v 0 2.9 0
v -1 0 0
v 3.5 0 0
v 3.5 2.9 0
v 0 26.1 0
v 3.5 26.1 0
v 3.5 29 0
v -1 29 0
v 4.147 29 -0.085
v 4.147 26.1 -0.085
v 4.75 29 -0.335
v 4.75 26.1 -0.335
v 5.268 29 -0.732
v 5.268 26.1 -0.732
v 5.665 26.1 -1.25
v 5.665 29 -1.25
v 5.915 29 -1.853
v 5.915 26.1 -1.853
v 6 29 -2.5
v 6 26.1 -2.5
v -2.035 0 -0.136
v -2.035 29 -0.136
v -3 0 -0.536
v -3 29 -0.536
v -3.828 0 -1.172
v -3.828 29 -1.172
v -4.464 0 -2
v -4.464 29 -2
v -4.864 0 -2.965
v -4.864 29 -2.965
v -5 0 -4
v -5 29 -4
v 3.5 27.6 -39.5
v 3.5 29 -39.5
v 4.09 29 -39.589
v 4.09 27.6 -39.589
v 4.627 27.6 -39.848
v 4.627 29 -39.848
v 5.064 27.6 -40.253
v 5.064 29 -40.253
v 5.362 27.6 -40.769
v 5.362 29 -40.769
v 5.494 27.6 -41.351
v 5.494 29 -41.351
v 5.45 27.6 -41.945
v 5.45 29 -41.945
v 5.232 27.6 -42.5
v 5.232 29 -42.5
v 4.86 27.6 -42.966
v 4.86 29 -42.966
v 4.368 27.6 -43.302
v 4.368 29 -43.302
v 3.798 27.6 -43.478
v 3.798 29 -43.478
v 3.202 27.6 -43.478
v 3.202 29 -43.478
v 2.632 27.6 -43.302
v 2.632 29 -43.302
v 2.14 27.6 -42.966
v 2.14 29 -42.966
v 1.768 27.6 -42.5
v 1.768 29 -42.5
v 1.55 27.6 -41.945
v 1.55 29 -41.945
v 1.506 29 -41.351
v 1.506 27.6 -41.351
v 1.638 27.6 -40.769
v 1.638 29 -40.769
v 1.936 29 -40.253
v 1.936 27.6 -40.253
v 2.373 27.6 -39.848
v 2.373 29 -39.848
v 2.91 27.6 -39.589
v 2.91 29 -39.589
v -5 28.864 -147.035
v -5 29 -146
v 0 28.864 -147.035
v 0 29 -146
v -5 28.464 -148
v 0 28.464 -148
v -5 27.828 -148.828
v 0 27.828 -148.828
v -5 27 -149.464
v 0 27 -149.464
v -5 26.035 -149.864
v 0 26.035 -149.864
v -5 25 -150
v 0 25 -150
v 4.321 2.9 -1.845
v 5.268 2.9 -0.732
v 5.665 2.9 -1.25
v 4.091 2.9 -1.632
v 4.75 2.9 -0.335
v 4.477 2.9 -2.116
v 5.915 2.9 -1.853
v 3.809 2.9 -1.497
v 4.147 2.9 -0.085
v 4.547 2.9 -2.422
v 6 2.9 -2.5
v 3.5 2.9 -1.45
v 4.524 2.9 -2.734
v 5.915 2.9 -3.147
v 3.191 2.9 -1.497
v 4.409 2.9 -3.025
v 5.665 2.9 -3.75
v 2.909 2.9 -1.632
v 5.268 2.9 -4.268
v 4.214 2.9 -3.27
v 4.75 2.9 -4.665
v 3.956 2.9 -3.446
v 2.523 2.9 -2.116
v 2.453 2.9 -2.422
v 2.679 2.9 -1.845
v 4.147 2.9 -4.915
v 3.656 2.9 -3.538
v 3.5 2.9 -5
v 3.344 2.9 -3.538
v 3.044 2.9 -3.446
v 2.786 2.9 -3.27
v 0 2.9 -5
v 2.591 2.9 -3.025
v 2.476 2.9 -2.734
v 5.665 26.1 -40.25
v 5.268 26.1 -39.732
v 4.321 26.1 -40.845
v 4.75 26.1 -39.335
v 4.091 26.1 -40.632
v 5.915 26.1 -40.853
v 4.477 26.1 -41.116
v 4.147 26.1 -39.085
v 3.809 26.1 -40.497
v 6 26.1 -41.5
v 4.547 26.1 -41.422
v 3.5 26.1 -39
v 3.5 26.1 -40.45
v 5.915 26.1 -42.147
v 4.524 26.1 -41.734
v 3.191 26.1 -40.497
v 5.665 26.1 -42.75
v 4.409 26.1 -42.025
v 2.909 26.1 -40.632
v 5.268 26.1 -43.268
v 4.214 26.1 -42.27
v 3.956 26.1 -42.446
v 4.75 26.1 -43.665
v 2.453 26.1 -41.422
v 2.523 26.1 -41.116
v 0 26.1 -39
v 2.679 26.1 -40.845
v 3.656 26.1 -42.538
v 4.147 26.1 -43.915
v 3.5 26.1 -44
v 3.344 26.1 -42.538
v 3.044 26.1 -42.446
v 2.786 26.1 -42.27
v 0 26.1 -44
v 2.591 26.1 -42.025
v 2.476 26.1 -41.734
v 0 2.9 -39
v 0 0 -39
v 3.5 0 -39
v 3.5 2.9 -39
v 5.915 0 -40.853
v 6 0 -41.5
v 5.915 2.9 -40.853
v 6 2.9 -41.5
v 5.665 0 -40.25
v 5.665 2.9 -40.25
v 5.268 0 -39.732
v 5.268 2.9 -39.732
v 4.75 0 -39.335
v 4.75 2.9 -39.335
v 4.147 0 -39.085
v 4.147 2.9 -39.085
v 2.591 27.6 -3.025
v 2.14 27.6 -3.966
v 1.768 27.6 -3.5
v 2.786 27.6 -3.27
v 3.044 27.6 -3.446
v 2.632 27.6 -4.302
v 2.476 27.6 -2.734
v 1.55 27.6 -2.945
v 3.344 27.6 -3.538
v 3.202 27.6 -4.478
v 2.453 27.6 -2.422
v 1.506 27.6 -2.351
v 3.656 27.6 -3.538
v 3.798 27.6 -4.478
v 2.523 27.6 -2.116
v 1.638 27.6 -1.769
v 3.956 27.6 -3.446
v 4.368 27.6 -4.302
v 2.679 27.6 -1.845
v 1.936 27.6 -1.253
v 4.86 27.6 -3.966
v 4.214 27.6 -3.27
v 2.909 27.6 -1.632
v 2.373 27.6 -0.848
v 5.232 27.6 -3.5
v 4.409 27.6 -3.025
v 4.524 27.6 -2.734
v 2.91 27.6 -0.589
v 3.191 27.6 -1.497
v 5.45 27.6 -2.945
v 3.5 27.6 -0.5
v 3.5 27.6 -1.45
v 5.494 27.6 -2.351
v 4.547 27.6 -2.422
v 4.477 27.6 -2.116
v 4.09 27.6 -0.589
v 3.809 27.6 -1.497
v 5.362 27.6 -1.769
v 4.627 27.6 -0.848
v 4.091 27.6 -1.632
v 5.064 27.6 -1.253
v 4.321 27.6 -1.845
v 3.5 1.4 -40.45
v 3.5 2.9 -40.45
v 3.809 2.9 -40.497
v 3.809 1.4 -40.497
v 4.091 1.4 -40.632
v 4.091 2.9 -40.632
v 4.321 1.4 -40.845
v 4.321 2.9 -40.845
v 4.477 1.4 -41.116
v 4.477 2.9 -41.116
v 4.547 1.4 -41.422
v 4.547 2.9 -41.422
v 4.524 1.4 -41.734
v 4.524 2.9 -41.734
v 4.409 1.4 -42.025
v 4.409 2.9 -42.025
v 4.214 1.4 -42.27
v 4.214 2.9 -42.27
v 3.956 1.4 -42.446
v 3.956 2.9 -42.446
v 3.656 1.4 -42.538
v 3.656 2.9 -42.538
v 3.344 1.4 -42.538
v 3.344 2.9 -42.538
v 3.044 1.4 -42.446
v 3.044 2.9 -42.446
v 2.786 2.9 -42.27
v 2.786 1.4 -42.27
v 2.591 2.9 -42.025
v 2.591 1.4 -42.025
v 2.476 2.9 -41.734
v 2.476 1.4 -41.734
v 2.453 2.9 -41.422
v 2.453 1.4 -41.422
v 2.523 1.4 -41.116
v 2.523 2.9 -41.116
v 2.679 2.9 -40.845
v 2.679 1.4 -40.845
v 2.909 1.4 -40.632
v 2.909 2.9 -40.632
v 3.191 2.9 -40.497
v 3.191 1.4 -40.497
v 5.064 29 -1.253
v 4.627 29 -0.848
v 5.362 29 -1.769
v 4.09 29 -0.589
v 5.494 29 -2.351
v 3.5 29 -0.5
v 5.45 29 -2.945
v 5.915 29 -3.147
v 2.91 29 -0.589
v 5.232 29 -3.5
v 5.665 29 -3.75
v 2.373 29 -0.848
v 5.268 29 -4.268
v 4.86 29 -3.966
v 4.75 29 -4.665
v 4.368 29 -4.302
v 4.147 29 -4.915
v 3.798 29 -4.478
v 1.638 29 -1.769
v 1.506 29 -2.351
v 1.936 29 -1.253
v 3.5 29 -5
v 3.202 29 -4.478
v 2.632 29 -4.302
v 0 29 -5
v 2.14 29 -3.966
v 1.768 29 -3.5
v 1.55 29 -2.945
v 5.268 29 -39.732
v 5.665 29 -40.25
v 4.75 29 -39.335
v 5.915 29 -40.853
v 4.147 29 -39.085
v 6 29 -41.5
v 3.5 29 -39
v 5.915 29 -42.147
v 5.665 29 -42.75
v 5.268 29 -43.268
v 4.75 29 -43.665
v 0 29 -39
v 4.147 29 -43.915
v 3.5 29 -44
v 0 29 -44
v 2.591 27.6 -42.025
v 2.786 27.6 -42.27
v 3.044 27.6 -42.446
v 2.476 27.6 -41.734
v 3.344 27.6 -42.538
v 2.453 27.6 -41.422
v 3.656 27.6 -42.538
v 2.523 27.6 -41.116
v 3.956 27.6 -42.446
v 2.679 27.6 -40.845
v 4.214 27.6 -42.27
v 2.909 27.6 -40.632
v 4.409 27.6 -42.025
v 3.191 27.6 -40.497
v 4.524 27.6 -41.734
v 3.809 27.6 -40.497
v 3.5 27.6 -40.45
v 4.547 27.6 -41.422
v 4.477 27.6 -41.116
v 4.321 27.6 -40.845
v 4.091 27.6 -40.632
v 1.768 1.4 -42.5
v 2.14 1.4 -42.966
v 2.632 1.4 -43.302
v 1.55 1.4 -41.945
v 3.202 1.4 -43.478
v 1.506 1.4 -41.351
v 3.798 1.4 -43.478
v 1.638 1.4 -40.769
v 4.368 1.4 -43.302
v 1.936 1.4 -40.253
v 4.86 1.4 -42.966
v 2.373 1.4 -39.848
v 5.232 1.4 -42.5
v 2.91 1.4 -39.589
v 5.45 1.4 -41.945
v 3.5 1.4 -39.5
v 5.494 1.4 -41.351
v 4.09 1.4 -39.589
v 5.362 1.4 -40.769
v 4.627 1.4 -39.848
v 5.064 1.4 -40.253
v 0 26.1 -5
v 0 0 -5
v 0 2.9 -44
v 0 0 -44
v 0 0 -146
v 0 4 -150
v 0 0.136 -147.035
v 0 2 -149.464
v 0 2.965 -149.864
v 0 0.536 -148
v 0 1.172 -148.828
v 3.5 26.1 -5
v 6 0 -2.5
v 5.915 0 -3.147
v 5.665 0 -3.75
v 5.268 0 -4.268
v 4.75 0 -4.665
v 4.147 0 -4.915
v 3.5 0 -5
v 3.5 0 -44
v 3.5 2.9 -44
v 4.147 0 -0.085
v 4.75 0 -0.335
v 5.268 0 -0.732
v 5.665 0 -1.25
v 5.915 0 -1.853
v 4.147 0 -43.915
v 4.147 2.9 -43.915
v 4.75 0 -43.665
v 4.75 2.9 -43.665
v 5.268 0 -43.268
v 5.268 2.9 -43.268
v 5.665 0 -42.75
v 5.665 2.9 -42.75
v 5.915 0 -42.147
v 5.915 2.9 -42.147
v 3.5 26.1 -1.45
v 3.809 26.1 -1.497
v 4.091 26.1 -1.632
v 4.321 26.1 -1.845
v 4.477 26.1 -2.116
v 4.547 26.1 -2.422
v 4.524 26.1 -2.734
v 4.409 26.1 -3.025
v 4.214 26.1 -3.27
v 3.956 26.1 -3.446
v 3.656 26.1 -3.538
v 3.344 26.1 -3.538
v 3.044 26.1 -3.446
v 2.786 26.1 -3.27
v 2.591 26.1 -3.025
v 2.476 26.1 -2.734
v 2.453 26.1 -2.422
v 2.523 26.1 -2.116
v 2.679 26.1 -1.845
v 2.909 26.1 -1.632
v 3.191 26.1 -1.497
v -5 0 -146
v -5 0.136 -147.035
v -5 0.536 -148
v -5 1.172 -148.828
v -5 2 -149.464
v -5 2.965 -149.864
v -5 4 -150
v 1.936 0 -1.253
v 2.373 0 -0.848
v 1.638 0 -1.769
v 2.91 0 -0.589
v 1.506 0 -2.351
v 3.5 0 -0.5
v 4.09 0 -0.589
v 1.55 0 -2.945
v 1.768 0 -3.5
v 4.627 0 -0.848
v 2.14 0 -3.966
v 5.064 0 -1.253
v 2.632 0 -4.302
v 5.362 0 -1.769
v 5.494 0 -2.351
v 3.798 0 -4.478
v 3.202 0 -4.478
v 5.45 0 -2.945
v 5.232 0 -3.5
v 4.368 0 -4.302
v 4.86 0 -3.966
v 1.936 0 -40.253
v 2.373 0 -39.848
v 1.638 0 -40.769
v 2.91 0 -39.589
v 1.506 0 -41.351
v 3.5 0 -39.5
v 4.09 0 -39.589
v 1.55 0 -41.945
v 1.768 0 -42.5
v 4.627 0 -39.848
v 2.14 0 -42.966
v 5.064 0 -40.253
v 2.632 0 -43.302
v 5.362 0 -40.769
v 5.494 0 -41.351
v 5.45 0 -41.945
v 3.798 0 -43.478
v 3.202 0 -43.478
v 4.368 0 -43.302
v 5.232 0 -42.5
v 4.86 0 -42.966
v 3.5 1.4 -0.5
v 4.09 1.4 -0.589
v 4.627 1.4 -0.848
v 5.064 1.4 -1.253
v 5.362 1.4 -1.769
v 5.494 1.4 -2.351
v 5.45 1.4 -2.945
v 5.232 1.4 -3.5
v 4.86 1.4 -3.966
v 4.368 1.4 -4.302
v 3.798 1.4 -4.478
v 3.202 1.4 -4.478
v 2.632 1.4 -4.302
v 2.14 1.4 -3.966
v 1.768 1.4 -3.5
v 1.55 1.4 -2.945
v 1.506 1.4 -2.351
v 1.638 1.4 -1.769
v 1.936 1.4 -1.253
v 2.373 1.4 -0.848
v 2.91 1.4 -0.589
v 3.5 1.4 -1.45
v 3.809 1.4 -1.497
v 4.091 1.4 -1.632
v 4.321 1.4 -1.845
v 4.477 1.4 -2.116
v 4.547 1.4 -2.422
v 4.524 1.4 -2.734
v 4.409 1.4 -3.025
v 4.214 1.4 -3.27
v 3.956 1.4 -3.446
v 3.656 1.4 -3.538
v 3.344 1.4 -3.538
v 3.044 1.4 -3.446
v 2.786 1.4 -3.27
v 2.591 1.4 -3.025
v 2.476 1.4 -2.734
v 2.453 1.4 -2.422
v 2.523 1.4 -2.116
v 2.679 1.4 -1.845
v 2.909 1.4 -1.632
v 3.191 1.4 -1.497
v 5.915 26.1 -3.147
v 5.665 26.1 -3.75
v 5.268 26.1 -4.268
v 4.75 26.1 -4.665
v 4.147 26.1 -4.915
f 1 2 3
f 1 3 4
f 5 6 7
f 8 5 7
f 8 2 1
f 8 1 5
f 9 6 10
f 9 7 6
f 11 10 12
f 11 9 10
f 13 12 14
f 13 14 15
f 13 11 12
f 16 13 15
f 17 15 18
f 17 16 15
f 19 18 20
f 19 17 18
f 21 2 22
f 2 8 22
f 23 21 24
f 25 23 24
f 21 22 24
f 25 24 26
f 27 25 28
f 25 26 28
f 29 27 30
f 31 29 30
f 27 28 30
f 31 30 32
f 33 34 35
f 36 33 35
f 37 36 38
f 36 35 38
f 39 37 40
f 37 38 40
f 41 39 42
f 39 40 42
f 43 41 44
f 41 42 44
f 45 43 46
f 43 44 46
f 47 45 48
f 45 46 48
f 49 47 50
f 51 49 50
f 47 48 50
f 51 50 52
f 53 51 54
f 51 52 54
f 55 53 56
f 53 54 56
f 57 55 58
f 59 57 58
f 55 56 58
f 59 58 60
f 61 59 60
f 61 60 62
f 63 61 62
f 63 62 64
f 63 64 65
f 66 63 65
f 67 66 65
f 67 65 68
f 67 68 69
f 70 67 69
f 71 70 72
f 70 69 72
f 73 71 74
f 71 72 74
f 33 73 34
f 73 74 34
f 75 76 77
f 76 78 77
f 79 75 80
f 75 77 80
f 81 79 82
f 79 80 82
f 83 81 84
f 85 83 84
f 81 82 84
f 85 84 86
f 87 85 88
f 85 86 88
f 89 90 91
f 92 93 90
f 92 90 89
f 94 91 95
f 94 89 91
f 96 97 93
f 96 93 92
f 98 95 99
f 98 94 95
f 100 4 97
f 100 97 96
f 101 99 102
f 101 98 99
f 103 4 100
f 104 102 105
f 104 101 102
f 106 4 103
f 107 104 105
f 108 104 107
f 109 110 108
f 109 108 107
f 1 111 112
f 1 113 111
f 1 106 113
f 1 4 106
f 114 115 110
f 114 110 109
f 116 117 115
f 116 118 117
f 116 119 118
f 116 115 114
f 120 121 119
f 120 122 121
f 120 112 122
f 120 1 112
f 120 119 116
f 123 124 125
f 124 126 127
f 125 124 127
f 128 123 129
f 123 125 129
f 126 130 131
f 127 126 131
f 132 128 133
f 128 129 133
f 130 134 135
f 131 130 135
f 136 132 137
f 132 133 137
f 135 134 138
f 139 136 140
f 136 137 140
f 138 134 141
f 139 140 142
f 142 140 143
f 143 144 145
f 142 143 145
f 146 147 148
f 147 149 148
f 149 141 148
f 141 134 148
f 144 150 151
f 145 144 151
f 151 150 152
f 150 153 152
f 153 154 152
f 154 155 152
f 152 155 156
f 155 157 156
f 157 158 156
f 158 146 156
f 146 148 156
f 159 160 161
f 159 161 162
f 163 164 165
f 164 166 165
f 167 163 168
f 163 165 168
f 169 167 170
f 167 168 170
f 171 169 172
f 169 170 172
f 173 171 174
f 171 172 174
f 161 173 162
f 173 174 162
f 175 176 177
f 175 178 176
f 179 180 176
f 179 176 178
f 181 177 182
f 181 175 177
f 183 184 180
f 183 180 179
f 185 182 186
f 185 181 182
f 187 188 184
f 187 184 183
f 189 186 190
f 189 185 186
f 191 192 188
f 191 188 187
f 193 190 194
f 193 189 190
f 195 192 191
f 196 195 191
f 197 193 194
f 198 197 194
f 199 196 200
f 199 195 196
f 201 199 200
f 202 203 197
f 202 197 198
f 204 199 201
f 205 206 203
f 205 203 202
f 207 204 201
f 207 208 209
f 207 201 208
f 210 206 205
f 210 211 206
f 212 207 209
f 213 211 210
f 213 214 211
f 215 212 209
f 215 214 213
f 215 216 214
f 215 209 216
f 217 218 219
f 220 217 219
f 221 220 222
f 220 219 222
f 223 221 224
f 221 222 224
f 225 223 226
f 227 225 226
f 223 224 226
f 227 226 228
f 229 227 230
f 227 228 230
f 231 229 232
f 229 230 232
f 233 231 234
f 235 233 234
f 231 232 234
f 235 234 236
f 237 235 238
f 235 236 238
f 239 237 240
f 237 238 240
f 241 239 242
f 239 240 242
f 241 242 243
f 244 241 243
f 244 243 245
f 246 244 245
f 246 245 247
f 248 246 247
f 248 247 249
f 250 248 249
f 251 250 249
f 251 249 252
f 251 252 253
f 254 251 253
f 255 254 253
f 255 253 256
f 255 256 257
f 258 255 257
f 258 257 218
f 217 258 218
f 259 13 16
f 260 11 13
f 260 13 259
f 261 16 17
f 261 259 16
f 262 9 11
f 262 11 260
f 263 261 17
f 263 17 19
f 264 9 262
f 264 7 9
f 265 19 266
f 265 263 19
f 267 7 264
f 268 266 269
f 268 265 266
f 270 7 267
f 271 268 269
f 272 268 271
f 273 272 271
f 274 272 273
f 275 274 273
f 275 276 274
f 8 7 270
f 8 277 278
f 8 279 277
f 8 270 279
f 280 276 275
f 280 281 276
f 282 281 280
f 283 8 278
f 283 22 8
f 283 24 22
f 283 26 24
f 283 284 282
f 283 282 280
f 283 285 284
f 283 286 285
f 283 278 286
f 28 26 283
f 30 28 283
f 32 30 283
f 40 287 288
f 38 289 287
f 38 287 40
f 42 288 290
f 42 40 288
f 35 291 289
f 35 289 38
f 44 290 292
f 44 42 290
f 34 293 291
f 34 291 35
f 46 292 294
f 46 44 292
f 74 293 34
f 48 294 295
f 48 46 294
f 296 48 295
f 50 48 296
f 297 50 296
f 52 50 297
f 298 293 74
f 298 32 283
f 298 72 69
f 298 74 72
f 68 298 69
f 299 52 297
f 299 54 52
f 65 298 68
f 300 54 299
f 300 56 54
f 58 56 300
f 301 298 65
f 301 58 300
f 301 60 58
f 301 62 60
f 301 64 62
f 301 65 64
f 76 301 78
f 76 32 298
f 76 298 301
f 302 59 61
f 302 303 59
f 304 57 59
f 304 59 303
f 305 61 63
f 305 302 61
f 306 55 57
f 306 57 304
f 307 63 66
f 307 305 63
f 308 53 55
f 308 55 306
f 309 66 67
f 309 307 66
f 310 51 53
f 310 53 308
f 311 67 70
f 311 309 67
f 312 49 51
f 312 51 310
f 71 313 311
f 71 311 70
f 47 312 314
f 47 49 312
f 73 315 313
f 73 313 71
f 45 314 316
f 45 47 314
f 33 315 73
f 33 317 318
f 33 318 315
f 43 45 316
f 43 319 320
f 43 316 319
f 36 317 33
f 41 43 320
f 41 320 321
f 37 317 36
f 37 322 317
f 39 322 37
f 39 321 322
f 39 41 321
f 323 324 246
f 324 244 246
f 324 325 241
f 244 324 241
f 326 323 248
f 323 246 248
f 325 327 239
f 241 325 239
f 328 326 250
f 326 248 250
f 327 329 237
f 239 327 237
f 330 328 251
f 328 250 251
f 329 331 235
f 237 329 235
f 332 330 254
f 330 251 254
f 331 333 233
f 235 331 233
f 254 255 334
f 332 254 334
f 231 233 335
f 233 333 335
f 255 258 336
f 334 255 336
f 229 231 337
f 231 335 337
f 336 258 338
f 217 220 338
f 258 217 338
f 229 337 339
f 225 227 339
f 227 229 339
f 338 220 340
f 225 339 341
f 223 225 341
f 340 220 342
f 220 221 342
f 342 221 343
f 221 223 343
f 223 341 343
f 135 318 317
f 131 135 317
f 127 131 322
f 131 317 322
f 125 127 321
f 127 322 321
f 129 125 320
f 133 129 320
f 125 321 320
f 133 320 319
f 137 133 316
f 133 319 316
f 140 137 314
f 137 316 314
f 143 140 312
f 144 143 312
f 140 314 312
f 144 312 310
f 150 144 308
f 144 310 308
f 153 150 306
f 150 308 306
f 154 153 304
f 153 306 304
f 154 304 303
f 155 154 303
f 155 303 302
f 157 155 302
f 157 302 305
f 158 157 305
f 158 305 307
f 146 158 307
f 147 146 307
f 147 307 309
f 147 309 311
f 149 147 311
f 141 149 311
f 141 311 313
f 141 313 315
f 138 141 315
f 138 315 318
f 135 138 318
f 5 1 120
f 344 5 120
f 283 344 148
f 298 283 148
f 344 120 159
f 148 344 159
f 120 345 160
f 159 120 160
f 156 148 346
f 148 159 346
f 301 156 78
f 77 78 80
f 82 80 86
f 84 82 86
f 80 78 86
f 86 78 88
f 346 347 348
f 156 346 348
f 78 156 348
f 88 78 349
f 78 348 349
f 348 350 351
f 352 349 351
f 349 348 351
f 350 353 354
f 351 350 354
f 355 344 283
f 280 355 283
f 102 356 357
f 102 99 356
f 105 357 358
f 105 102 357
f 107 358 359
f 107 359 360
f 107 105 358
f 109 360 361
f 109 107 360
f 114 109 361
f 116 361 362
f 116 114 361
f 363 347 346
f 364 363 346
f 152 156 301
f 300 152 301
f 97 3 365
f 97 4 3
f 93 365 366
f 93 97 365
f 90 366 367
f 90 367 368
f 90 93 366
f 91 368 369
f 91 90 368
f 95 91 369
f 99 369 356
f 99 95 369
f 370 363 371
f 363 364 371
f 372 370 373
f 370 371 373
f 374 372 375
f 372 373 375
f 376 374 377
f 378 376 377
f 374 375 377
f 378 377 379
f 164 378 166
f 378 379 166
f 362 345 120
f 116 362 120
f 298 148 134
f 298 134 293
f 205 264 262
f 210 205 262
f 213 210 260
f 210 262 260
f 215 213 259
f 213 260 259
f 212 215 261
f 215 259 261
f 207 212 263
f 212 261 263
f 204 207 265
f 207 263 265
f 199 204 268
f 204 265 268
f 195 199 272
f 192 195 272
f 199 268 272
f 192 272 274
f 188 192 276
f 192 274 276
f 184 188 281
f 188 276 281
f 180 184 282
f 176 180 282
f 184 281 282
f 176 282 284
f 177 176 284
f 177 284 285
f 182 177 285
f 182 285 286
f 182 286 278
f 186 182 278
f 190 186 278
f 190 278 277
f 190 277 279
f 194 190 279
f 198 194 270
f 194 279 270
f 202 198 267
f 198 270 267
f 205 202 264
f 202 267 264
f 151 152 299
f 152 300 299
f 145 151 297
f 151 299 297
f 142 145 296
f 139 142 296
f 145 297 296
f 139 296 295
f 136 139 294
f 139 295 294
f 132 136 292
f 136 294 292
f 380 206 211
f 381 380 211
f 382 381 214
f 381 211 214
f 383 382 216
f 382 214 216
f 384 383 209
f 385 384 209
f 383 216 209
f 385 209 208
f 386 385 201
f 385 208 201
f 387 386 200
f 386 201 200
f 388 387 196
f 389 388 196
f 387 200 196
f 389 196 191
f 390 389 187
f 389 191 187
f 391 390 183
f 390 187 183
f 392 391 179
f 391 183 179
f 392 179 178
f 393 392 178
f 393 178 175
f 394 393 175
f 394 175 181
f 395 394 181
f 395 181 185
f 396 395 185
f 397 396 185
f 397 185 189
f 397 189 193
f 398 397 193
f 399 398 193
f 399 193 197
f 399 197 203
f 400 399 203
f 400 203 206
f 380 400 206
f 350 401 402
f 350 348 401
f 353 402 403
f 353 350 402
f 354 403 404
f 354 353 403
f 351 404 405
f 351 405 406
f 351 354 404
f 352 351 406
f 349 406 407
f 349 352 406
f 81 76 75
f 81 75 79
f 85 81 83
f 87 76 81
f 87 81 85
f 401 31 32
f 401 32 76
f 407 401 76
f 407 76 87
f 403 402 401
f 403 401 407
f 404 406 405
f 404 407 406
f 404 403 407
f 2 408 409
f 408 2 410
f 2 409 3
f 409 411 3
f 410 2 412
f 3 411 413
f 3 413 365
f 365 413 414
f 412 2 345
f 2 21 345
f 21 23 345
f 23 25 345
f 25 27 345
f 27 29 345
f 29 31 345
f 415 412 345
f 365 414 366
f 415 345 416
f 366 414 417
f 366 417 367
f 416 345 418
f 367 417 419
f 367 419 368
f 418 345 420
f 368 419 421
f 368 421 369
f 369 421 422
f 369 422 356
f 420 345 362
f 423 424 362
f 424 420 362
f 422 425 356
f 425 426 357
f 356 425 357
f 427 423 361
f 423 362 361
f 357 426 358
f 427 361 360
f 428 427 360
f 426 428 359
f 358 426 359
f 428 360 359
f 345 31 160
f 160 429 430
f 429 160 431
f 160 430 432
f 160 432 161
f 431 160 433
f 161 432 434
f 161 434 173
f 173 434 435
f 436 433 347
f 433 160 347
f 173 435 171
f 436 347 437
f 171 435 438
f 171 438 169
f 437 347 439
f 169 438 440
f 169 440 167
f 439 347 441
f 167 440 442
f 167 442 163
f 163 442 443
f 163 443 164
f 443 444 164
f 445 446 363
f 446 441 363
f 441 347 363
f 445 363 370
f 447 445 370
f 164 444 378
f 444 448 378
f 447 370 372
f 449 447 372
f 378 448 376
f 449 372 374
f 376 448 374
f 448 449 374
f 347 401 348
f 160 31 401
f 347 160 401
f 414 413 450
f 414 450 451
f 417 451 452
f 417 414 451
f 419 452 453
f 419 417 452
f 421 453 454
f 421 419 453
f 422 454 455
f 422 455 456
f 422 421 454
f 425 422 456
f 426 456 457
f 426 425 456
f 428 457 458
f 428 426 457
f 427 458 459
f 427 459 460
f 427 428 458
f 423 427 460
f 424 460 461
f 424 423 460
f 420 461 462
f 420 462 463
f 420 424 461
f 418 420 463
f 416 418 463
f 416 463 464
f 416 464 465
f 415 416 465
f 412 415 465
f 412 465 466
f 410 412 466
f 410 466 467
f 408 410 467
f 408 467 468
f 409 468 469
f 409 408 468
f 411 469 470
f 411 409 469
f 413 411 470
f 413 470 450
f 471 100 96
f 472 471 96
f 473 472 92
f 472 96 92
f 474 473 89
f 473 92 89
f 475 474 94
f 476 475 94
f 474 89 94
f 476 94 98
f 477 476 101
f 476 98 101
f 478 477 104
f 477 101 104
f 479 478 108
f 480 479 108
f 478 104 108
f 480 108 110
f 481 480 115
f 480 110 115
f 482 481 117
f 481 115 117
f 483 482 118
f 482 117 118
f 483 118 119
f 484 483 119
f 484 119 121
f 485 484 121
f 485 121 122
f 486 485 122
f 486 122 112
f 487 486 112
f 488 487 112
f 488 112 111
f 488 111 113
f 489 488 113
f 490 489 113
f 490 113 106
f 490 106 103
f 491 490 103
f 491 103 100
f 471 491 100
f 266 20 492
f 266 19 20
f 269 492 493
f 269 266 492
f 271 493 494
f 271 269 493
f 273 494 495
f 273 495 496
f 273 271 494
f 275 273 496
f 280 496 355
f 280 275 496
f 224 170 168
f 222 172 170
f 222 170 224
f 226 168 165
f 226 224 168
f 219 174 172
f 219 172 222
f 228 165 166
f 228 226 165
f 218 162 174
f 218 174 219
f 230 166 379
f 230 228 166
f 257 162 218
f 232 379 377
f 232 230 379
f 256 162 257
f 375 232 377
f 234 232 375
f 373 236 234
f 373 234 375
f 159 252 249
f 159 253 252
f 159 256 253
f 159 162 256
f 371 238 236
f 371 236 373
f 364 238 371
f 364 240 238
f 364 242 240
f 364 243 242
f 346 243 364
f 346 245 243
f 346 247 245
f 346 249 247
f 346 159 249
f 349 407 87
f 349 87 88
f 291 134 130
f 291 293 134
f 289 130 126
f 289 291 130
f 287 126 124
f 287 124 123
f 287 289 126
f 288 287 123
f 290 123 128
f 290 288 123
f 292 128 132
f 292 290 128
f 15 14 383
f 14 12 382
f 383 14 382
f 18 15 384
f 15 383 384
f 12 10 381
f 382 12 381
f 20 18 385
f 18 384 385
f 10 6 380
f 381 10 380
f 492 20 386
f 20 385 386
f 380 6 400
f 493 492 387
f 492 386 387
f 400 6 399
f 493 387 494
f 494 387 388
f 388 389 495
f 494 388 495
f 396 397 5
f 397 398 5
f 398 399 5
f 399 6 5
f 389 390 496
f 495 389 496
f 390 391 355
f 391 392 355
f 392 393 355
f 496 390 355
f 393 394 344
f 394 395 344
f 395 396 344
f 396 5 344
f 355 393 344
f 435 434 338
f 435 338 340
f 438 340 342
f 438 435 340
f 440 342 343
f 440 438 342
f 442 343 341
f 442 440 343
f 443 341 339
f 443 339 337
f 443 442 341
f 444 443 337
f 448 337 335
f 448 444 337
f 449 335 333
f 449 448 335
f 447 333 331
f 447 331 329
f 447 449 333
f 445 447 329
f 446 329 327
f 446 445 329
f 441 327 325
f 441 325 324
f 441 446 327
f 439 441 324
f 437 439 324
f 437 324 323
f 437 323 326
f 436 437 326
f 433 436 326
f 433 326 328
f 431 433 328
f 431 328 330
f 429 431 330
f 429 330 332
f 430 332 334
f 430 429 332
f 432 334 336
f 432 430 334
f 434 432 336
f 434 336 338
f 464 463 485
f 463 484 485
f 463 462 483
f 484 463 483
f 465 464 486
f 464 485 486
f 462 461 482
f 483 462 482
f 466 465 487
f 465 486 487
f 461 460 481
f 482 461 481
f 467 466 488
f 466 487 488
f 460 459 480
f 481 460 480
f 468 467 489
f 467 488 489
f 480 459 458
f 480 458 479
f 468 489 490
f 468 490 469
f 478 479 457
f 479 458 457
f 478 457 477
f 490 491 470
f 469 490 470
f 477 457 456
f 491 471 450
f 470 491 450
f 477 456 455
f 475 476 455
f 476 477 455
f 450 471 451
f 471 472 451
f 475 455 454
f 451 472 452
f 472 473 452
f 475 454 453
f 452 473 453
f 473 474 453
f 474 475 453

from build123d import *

# Parameters (mm, degrees)
SKETCH1_W           = 5
SKETCH1_H           = 150
BOSS_EXTRUDE1_DEPTH = 29
SKETCH2_W           = 5
SKETCH2_H           = 2.9
BOSS_EXTRUDE2_DEPTH = 6
SKETCH3_R           = 1.05
CUT_EXTRUDE1_DEPTH  = 153.895389074
SKETCH4_R           = 2
CUT_EXTRUDE2_DEPTH  = 1.4
FILLET1_R           = 4
FILLET2_R           = 2.5


with BuildPart() as part:
    # Sketch1 → Boss-Extrude1 (new body)
    with BuildSketch(Plane(origin=(0, 0, 0), x_dir=(1, 0, 0), z_dir=(0, 1, 0))):
        with Locations((-2.5, 75)):
            Rectangle(SKETCH1_W, SKETCH1_H)
    extrude(amount=BOSS_EXTRUDE1_DEPTH)

    # Sketch2 → Boss-Extrude2 (add)
    with BuildSketch(Plane(origin=(0, 0, 0), x_dir=(0, 0, -1), z_dir=(1, 0, 0))):
        with Locations((2.5, 27.55)):
            Rectangle(SKETCH2_W, SKETCH2_H)
        with Locations((41.5, 27.55)):
            Rectangle(SKETCH2_W, SKETCH2_H)
        with Locations((41.5, 1.45)):
            Rectangle(SKETCH2_W, SKETCH2_H)
        with Locations((2.5, 1.45)):
            Rectangle(SKETCH2_W, SKETCH2_H)
    extrude(amount=BOSS_EXTRUDE2_DEPTH)

    # Sketch3 → Cut-Extrude1 (cut, through all)
    with BuildSketch(Plane(origin=(0, 29, 0), x_dir=(1, 0, 0), z_dir=(0, 1, 0))):
        with Locations(Location((3.5, 41.5, 0), (0, 0, 270))):
            Circle(SKETCH3_R)
        with Locations(Location((3.5, 2.5, 0), (0, 0, 270))):
            Circle(SKETCH3_R)
    extrude(amount=-CUT_EXTRUDE1_DEPTH, mode=Mode.SUBTRACT)

    # Sketch4 → Cut-Extrude2 (cut)
    with BuildSketch(Plane(origin=(0, 29, 0), x_dir=(1, 0, 0), z_dir=(0, 1, 0))):
        with Locations(Location((3.5, 41.5, 0), (0, 0, 270))):
            Circle(SKETCH4_R)
        with Locations(Location((3.5, 2.5, 0), (0, 0, 270))):
            Circle(SKETCH4_R)
    cut_extrude2 = extrude(amount=-CUT_EXTRUDE2_DEPTH, mode=Mode.SUBTRACT)

    # Mirror2: Cut-Extrude2 across plane
    add(cut_extrude2.mirror(Plane.ZX.offset(14.5)), mode=Mode.SUBTRACT)

    # Fillet1
    fillet1_edges = [part.edges().sort_by_distance(p)[0] for p in [
        (-2.5, 0, -150),
        (-5, 14.5, 0),
        (-2.5, 29, -150),
    ]]
    fillet(fillet1_edges, radius=FILLET1_R)

    # Fillet2
    fillet2_edges = [part.edges().sort_by_distance(p)[0] for p in [
        (6, 1.45, -5),
        (6, 1.45, 0),
        (6, 1.45, -44),
        (6, 1.45, -39),
        (6, 27.55, -44),
        (6, 27.55, -39),
        (6, 27.55, -5),
        (6, 27.55, 0),
    ]]
    fillet(fillet2_edges, radius=FILLET2_R - 0.0001)  # a hair under: the kernel refuses the full size


solid = part.part
